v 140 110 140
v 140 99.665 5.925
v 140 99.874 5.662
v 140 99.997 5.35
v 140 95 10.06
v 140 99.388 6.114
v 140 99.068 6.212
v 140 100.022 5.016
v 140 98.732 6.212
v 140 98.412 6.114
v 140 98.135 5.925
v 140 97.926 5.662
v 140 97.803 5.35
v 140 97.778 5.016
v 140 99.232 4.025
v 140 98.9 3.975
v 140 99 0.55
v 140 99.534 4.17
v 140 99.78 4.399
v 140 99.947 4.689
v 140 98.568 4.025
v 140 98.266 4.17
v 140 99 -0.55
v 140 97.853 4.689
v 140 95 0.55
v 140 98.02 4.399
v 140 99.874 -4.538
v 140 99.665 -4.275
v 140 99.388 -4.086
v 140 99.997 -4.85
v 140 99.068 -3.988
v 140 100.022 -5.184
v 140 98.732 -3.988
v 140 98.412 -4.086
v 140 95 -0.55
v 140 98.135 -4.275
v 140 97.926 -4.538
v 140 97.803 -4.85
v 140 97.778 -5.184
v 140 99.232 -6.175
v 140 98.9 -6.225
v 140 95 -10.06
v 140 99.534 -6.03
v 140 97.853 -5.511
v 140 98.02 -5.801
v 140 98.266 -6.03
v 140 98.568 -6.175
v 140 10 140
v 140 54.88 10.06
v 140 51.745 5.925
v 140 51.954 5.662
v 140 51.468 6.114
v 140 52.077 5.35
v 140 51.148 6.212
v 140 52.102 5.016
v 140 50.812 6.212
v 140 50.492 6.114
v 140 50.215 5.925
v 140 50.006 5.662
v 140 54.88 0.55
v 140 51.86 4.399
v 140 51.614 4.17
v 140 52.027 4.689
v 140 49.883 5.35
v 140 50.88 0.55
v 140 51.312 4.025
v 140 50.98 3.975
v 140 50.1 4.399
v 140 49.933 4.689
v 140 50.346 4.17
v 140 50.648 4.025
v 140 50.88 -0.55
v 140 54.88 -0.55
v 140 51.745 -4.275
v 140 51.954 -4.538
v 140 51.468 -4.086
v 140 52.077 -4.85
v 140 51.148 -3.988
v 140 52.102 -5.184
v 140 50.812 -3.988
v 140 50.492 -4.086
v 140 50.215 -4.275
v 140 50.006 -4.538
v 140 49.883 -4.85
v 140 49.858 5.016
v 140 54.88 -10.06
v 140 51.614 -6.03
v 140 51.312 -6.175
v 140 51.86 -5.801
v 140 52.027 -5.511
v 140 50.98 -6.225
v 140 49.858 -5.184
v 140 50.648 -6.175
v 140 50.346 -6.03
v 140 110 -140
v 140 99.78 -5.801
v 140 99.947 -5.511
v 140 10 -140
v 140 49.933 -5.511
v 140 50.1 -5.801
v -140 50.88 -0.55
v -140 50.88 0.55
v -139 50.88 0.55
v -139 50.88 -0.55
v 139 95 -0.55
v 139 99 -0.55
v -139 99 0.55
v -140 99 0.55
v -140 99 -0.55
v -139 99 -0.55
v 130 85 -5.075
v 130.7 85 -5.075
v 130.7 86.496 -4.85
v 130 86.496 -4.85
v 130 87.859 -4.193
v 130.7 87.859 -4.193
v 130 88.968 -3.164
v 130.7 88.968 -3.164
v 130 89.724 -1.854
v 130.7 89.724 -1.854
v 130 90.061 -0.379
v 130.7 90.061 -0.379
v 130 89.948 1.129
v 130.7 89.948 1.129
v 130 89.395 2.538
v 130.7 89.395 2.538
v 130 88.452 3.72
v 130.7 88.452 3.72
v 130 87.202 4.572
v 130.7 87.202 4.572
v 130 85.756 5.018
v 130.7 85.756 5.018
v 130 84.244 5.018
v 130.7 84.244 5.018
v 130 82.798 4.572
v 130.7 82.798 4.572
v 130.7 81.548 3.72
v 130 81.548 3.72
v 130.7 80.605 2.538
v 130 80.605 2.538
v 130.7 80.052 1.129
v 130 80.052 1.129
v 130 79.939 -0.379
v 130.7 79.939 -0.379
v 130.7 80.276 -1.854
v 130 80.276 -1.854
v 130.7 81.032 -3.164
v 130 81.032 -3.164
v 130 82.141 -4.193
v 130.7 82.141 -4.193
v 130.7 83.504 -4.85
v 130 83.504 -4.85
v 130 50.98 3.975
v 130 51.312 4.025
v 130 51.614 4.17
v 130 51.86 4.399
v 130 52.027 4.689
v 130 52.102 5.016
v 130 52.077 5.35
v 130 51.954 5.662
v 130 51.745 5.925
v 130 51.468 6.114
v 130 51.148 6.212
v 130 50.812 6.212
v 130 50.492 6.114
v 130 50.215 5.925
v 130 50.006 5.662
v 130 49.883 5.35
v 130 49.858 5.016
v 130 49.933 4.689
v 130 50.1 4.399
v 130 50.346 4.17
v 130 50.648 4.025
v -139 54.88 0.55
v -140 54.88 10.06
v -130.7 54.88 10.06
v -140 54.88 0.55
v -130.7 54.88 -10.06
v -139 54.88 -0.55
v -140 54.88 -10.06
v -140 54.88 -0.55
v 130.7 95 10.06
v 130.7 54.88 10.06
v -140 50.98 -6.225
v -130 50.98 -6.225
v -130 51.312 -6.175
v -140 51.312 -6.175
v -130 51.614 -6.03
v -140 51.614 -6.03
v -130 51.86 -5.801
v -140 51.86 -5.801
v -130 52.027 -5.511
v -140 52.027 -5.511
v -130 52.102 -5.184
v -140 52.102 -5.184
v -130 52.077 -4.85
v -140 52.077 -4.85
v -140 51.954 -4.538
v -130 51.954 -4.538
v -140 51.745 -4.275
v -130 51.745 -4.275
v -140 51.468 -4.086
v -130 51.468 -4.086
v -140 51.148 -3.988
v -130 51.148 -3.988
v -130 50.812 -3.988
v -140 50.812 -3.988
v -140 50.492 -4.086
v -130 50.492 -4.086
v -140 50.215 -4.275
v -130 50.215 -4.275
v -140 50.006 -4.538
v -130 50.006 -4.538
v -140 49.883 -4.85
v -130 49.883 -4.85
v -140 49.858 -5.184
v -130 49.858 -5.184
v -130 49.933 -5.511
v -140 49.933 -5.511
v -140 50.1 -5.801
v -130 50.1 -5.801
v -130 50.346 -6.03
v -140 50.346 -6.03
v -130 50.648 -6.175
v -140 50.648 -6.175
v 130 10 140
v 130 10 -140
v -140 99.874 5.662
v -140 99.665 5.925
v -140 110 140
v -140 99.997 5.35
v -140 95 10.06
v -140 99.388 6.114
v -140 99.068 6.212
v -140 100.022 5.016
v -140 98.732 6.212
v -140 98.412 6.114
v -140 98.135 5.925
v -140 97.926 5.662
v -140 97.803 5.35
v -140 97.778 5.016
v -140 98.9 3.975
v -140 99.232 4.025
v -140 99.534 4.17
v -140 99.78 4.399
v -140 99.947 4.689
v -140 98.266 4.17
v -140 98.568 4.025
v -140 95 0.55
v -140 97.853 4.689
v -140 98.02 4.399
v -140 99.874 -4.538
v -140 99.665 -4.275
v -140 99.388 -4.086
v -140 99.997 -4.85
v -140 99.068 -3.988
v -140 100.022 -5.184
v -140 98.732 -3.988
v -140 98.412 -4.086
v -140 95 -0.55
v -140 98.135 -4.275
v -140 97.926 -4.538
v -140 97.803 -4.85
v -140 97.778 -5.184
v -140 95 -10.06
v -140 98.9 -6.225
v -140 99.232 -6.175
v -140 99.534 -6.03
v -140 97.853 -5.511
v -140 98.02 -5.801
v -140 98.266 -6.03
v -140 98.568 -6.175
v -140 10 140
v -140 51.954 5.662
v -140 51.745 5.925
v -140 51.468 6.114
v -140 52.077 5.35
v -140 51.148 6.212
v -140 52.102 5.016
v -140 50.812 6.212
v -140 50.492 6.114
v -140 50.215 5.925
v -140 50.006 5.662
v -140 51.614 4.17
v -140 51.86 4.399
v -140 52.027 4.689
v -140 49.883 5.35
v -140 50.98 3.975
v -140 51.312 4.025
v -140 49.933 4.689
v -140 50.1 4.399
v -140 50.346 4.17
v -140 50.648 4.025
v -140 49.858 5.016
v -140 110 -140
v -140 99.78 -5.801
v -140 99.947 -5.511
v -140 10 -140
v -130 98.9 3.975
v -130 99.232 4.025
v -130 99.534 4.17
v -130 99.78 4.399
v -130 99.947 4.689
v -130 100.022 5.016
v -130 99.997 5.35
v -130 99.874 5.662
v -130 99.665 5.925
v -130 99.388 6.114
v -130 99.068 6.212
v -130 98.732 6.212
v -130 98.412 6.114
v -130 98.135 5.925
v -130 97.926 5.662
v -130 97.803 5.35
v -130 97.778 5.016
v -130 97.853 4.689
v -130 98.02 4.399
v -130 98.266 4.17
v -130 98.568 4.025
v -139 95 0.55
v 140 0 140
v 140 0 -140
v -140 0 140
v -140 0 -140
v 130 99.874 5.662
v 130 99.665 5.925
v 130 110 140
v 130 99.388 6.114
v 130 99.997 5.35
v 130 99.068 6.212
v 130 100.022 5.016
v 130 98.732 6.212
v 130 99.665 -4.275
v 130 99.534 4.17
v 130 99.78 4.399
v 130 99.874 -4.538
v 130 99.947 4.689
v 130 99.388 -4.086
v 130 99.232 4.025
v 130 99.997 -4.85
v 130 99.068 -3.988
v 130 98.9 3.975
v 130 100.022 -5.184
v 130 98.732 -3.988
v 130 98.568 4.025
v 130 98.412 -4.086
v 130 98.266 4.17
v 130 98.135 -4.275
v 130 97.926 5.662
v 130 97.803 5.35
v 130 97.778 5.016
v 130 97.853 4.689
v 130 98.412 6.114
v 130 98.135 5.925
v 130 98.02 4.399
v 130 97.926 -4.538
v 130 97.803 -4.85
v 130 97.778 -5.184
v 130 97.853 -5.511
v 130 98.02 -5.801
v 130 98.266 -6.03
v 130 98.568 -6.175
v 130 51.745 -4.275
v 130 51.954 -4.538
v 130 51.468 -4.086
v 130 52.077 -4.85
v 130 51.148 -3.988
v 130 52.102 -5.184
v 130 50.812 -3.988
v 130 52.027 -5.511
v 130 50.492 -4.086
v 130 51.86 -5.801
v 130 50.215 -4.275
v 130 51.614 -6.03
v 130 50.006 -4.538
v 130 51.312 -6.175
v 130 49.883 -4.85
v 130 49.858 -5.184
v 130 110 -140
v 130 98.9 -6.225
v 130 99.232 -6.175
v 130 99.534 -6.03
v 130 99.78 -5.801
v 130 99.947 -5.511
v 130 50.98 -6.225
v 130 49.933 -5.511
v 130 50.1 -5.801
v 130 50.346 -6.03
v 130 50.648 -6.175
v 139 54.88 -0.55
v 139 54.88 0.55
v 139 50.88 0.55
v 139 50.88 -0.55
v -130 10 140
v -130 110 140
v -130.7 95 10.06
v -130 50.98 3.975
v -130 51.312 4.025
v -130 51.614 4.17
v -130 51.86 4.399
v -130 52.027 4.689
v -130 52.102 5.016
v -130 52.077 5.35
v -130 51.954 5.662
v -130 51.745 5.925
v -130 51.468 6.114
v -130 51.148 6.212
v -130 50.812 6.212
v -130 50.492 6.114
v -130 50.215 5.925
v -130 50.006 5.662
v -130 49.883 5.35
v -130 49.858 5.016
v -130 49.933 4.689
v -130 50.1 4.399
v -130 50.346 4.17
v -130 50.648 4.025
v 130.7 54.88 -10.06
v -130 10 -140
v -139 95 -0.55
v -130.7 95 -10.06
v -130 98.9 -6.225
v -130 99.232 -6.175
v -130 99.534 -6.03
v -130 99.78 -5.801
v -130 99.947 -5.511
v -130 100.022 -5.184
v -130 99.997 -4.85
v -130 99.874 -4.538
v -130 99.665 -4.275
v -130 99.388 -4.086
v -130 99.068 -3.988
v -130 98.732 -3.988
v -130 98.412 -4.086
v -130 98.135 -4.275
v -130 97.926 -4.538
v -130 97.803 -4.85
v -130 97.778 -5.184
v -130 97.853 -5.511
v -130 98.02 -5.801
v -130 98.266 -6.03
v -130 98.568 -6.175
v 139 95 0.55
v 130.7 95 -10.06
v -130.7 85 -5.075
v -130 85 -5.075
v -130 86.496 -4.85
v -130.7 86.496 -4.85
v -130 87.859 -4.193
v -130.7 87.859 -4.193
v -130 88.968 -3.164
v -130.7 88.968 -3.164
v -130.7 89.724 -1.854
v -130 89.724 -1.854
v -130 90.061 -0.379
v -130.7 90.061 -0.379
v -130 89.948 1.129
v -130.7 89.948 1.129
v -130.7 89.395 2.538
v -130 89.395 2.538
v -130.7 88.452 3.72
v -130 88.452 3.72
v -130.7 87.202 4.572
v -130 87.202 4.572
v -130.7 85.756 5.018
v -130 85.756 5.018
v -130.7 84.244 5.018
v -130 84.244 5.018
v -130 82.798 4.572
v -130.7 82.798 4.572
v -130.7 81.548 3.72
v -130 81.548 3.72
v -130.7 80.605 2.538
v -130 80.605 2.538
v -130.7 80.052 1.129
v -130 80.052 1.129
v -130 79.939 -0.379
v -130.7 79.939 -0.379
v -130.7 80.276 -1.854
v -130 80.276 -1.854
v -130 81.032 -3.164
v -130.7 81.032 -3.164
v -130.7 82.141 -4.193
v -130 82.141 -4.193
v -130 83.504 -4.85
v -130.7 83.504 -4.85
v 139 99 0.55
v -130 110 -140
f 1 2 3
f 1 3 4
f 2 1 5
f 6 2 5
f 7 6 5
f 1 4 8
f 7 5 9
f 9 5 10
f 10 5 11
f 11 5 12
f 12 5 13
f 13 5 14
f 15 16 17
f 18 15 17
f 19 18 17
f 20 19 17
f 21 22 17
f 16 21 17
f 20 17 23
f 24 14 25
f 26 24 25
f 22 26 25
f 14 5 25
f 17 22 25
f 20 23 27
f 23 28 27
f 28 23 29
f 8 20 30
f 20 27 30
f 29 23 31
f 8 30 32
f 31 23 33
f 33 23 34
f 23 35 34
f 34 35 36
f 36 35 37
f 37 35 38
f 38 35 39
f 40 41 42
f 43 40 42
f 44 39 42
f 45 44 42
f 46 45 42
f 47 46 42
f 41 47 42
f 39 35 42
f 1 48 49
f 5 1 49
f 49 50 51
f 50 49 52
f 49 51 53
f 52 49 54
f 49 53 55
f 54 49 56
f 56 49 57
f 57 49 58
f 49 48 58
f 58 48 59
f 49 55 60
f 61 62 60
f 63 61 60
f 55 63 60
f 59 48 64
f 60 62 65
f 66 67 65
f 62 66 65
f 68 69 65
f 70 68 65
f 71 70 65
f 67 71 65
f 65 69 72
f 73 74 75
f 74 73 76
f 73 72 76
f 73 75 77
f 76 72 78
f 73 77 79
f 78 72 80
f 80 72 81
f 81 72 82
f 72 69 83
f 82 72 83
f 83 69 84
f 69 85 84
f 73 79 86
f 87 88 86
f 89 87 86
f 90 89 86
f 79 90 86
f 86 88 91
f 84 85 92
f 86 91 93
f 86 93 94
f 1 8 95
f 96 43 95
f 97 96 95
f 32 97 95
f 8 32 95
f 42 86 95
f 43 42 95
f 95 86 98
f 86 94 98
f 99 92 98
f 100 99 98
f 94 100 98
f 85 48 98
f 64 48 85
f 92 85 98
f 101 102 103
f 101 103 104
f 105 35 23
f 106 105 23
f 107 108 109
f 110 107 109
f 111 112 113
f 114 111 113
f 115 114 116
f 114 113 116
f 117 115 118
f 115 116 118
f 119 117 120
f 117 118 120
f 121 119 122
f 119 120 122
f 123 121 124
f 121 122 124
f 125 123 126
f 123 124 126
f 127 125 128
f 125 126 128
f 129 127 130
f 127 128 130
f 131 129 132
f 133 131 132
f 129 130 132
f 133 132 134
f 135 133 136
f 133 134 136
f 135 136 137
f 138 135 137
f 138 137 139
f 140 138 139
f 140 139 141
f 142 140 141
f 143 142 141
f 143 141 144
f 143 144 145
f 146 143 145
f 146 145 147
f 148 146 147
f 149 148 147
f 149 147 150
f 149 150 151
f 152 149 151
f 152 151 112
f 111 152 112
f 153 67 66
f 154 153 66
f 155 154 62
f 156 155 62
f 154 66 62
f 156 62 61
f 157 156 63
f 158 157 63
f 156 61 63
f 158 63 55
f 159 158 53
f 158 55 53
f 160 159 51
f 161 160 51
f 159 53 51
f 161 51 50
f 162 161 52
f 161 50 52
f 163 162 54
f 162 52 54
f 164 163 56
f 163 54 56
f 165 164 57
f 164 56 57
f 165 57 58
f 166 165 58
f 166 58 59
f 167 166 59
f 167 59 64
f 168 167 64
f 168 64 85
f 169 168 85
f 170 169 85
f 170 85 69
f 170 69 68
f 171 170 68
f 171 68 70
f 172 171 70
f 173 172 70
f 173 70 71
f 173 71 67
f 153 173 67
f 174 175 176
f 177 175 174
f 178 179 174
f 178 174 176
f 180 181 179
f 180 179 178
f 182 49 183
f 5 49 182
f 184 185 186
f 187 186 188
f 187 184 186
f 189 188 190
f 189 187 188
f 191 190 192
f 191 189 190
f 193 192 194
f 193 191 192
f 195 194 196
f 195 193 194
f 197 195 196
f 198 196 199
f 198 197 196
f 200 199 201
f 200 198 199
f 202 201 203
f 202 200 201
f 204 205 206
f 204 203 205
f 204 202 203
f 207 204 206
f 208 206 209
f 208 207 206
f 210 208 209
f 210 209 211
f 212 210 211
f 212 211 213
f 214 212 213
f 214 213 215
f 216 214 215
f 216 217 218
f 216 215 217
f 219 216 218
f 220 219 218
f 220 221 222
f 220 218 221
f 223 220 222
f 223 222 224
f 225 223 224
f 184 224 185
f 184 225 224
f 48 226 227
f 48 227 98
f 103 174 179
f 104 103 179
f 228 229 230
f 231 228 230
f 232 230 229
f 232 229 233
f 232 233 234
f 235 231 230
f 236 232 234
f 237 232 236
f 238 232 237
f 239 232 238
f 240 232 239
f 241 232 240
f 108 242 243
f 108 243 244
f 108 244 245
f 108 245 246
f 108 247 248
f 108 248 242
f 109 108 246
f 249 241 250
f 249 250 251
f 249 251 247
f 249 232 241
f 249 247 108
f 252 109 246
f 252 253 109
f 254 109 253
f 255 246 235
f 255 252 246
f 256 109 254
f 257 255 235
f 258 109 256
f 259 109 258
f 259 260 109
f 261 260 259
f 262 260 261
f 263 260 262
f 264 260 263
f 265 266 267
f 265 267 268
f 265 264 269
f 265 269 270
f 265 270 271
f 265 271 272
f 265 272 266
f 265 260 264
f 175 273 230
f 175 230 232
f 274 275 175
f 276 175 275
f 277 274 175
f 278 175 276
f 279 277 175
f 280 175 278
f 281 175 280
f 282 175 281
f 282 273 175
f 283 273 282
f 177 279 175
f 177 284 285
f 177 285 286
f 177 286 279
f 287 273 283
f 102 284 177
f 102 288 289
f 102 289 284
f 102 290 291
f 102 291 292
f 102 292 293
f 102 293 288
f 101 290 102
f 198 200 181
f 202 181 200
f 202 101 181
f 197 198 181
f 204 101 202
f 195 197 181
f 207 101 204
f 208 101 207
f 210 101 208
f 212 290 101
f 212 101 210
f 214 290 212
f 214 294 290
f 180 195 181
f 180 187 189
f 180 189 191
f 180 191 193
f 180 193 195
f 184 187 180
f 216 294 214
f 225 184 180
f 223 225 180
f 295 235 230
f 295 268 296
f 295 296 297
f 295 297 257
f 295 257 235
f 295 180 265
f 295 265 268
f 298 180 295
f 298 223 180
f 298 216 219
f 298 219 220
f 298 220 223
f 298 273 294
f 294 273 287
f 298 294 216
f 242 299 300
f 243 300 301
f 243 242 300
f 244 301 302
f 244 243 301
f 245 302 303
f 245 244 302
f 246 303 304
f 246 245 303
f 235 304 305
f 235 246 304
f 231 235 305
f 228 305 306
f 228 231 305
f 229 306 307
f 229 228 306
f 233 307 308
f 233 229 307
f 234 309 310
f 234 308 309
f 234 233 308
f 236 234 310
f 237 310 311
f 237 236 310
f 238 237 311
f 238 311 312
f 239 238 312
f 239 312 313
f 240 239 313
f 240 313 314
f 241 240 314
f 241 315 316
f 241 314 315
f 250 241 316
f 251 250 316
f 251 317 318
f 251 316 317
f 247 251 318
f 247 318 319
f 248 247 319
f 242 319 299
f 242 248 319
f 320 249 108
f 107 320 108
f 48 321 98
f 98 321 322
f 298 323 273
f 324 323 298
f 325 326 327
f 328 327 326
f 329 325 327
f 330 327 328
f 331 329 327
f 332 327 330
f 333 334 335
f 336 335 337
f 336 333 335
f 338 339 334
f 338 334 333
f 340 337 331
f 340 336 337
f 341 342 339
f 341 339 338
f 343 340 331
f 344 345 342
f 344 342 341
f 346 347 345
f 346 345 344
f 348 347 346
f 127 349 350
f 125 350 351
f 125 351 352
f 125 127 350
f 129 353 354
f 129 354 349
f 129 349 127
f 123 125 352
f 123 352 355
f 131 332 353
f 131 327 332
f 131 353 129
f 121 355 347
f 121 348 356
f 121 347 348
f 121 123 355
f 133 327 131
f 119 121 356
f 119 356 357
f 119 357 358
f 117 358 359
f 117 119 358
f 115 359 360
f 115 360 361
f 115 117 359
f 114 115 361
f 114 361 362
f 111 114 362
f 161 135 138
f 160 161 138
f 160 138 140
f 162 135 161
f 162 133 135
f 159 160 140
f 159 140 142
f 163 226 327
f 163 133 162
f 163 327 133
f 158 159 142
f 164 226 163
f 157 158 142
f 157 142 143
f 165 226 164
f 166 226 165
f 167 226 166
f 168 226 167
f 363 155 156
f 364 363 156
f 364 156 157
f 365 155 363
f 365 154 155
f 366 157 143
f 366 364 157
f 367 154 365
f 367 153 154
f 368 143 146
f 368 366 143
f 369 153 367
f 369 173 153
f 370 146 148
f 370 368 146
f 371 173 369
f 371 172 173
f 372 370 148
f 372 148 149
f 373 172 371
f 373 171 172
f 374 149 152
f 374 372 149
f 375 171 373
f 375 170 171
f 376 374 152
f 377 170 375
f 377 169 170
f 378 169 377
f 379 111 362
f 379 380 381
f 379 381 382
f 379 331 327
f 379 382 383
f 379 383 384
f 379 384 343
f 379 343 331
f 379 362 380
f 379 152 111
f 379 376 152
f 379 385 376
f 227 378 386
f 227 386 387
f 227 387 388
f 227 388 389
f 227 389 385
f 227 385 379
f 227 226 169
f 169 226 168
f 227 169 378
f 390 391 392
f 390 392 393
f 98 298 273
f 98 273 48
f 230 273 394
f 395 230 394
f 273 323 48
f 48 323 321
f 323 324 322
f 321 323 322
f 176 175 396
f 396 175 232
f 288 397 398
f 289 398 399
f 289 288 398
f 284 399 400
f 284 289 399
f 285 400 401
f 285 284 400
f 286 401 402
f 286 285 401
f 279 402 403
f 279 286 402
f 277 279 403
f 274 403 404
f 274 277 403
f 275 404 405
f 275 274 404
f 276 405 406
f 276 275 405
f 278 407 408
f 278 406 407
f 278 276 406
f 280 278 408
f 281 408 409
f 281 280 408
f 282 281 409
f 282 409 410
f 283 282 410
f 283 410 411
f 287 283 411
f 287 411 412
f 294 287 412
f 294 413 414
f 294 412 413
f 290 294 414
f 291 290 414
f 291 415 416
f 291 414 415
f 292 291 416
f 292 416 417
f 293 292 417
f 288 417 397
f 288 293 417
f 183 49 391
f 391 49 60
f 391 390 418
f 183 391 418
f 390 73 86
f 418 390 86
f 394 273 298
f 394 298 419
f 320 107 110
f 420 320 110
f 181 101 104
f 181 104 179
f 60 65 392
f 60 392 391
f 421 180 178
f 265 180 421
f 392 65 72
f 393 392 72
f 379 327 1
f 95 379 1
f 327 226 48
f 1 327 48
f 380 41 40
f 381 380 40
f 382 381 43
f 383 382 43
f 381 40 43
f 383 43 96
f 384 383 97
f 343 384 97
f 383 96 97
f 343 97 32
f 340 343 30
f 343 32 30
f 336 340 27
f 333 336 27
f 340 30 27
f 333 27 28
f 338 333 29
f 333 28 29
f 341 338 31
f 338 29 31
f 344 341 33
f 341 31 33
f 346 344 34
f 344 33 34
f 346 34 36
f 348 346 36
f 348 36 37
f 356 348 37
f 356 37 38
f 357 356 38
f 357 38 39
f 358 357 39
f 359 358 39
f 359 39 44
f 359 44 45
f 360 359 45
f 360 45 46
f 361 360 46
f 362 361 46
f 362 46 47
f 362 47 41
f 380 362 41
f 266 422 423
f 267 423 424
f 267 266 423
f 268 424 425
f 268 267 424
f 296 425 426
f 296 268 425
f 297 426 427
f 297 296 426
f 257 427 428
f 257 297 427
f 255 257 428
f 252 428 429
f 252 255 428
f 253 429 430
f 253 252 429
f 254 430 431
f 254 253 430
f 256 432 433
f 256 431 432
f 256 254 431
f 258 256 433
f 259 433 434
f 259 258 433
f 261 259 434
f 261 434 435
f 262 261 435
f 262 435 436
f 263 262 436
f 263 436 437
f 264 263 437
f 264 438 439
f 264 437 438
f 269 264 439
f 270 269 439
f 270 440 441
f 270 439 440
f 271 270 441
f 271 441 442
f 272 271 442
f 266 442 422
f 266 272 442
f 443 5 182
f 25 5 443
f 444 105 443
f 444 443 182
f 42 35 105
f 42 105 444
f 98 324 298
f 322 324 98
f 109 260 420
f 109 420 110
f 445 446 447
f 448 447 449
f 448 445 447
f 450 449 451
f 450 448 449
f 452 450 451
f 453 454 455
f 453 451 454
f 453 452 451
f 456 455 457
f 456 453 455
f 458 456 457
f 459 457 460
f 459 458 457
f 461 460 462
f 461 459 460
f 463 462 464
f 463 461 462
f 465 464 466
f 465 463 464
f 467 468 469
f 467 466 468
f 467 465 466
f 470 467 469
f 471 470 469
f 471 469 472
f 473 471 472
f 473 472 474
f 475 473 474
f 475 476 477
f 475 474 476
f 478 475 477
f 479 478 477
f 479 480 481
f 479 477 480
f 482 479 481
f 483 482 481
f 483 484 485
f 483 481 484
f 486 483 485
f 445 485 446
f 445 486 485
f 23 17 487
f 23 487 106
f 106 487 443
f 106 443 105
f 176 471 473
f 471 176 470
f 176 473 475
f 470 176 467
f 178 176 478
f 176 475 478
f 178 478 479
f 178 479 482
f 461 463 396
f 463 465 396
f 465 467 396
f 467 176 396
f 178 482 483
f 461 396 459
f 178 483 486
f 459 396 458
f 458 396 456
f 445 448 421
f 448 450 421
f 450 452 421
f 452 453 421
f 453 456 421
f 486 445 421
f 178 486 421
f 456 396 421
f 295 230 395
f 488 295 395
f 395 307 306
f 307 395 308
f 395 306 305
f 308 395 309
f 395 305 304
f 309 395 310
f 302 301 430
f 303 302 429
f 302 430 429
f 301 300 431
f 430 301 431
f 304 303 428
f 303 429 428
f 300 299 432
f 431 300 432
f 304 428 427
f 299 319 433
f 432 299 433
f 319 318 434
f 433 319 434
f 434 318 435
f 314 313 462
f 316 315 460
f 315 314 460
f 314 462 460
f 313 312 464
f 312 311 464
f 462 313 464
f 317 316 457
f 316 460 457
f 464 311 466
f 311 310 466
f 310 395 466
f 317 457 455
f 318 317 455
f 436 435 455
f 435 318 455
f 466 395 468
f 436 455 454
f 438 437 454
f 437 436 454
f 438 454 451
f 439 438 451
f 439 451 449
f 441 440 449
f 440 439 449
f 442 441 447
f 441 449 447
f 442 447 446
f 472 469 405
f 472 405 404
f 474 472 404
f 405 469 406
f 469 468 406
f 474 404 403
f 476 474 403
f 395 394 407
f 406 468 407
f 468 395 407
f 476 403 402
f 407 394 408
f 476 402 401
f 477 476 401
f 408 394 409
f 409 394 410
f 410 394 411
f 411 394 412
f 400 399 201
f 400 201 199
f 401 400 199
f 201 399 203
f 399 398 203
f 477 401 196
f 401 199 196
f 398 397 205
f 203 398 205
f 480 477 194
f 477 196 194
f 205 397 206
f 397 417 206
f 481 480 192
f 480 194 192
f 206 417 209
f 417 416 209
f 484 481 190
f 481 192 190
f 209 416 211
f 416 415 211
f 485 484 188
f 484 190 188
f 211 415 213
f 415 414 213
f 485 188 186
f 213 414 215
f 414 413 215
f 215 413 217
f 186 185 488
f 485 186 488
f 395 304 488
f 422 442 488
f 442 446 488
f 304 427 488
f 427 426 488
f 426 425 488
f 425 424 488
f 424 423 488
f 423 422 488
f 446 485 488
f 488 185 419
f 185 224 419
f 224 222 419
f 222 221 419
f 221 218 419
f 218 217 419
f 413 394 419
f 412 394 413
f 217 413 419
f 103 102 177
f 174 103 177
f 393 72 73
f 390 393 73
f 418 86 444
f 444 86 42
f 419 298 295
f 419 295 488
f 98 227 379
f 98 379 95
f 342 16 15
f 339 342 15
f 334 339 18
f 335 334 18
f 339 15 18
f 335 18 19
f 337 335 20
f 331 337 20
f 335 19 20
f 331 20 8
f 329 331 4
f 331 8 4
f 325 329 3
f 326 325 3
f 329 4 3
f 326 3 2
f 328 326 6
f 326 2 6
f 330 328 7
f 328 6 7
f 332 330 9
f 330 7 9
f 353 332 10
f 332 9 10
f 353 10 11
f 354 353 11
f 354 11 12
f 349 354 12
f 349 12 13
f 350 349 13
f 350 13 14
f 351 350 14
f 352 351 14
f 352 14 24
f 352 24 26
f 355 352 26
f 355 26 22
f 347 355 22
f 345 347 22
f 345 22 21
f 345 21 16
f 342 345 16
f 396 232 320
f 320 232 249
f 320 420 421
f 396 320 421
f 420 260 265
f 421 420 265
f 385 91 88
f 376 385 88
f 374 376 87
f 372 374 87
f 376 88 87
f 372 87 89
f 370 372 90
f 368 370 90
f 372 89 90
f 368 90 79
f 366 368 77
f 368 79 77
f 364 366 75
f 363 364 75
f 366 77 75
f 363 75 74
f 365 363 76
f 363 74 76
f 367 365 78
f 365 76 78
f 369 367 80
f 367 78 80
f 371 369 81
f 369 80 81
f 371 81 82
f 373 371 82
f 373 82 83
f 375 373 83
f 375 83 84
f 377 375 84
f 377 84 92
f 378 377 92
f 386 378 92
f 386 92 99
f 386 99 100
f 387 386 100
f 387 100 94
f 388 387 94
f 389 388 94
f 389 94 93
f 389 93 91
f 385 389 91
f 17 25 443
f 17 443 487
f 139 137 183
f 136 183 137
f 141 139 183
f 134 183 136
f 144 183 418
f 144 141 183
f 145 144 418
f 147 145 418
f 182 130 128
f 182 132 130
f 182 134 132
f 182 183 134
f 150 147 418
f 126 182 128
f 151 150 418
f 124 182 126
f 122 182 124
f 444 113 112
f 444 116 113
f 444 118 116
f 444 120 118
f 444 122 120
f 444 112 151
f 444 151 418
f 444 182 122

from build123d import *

# Parameters (mm, degrees)
SKETCH1_W             = 280
SKETCH1_H             = 280
BOSS_EXTRUDE1_DEPTH   = 10
SKETCH3_W             = 10
SKETCH3_H             = 280
BOSS_EXTRUDE2_DEPTH   = 100
BOSS_EXTRUDE2_2_DEPTH = 100
SKETCH4_W             = 20.12
SKETCH4_H             = 40.12
CUT_EXTRUDE2_DEPTH    = 9.3
SKETCH8_W             = 1.1
SKETCH8_H             = 48.12
CUT_EXTRUDE5_DEPTH    = 1
SKETCH5_R             = 5.075
CUT_EXTRUDE3_DEPTH    = 10
SKETCH7_R             = 1.125
CUT_EXTRUDE4_DEPTH    = 20


with BuildPart() as part:
    # Sketch1 → Boss-Extrude1 (new body)
    with BuildSketch(Plane(origin=(0, 0, 0), x_dir=(1, 0, 0), z_dir=(0, 1, 0))):
        Rectangle(SKETCH1_W, SKETCH1_H)
    extrude(amount=BOSS_EXTRUDE1_DEPTH)


with BuildPart() as body_2:
    # Sketch3 → Boss-Extrude2 (new body)
    with BuildSketch(Plane(origin=(0, 10, 0), x_dir=(1, 0, 0), z_dir=(0, 1, 0))):
        with Locations((135, 0)):
            Rectangle(SKETCH3_W, SKETCH3_H)
    extrude(amount=BOSS_EXTRUDE2_DEPTH)

    # Sketch4 → Cut-Extrude2 (cut)
    with BuildSketch(Plane(origin=(140, 0, 0), x_dir=(0, 0, -1), z_dir=(1, 0, 0))):
        with Locations((0, 74.94)):
            Rectangle(SKETCH4_W, SKETCH4_H)
    cut_extrude2 = extrude(amount=-CUT_EXTRUDE2_DEPTH, mode=Mode.SUBTRACT)

    # Sketch8 → Cut-Extrude5 (cut)
    with BuildSketch(Plane(origin=(140, 0, 0), x_dir=(0, 0, -1), z_dir=(1, 0, 0))):
        with Locations((0, 74.94)):
            Rectangle(SKETCH8_W, SKETCH8_H)
    cut_extrude5 = extrude(amount=-CUT_EXTRUDE5_DEPTH, mode=Mode.SUBTRACT)

    # Sketch5 → Cut-Extrude3 (cut)
    with BuildSketch(Plane(origin=(130.7, 0, 0), x_dir=(0, 0, -1), z_dir=(1, 0, 0))):
        with Locations((0, 85)):
            Circle(SKETCH5_R)
    cut_extrude3 = extrude(amount=-CUT_EXTRUDE3_DEPTH, mode=Mode.SUBTRACT)

    # Sketch7 → Cut-Extrude4 (cut)
    with BuildSketch(Plane(origin=(140, 0, 0), x_dir=(0, 0, -1), z_dir=(1, 0, 0))):
        with Locations((-5.1, 98.9)):
            Circle(SKETCH7_R)
        with Locations((5.1, 98.9)):
            Circle(SKETCH7_R)
        with Locations((5.1, 50.98)):
            Circle(SKETCH7_R)
        with Locations((-5.1, 50.98)):
            Circle(SKETCH7_R)
    cut_extrude4 = extrude(amount=-CUT_EXTRUDE4_DEPTH, mode=Mode.SUBTRACT)


with BuildPart() as body_3:
    # Sketch3 → Boss-Extrude2 2 (new body)
    with BuildSketch(Plane(origin=(0, 10, 0), x_dir=(1, 0, 0), z_dir=(0, 1, 0))):
        with Locations((-135, 0)):
            Rectangle(SKETCH3_W, SKETCH3_H)
    extrude(amount=BOSS_EXTRUDE2_2_DEPTH)

    # Mirror1: Cut-Extrude2, Cut-Extrude5, Cut-Extrude3, Cut-Extrude4 across plane
    add(cut_extrude2.mirror(Plane(origin=(0, 0, 0), x_dir=(0, 0, 1), z_dir=(1, 0, 0))), mode=Mode.SUBTRACT)
    add(cut_extrude5.mirror(Plane(origin=(0, 0, 0), x_dir=(0, 0, 1), z_dir=(1, 0, 0))), mode=Mode.SUBTRACT)
    add(cut_extrude3.mirror(Plane(origin=(0, 0, 0), x_dir=(0, 0, 1), z_dir=(1, 0, 0))), mode=Mode.SUBTRACT)
    add(cut_extrude4.mirror(Plane(origin=(0, 0, 0), x_dir=(0, 0, 1), z_dir=(1, 0, 0))), mode=Mode.SUBTRACT)


solid = Compound([part.part, body_2.part, body_3.part])
